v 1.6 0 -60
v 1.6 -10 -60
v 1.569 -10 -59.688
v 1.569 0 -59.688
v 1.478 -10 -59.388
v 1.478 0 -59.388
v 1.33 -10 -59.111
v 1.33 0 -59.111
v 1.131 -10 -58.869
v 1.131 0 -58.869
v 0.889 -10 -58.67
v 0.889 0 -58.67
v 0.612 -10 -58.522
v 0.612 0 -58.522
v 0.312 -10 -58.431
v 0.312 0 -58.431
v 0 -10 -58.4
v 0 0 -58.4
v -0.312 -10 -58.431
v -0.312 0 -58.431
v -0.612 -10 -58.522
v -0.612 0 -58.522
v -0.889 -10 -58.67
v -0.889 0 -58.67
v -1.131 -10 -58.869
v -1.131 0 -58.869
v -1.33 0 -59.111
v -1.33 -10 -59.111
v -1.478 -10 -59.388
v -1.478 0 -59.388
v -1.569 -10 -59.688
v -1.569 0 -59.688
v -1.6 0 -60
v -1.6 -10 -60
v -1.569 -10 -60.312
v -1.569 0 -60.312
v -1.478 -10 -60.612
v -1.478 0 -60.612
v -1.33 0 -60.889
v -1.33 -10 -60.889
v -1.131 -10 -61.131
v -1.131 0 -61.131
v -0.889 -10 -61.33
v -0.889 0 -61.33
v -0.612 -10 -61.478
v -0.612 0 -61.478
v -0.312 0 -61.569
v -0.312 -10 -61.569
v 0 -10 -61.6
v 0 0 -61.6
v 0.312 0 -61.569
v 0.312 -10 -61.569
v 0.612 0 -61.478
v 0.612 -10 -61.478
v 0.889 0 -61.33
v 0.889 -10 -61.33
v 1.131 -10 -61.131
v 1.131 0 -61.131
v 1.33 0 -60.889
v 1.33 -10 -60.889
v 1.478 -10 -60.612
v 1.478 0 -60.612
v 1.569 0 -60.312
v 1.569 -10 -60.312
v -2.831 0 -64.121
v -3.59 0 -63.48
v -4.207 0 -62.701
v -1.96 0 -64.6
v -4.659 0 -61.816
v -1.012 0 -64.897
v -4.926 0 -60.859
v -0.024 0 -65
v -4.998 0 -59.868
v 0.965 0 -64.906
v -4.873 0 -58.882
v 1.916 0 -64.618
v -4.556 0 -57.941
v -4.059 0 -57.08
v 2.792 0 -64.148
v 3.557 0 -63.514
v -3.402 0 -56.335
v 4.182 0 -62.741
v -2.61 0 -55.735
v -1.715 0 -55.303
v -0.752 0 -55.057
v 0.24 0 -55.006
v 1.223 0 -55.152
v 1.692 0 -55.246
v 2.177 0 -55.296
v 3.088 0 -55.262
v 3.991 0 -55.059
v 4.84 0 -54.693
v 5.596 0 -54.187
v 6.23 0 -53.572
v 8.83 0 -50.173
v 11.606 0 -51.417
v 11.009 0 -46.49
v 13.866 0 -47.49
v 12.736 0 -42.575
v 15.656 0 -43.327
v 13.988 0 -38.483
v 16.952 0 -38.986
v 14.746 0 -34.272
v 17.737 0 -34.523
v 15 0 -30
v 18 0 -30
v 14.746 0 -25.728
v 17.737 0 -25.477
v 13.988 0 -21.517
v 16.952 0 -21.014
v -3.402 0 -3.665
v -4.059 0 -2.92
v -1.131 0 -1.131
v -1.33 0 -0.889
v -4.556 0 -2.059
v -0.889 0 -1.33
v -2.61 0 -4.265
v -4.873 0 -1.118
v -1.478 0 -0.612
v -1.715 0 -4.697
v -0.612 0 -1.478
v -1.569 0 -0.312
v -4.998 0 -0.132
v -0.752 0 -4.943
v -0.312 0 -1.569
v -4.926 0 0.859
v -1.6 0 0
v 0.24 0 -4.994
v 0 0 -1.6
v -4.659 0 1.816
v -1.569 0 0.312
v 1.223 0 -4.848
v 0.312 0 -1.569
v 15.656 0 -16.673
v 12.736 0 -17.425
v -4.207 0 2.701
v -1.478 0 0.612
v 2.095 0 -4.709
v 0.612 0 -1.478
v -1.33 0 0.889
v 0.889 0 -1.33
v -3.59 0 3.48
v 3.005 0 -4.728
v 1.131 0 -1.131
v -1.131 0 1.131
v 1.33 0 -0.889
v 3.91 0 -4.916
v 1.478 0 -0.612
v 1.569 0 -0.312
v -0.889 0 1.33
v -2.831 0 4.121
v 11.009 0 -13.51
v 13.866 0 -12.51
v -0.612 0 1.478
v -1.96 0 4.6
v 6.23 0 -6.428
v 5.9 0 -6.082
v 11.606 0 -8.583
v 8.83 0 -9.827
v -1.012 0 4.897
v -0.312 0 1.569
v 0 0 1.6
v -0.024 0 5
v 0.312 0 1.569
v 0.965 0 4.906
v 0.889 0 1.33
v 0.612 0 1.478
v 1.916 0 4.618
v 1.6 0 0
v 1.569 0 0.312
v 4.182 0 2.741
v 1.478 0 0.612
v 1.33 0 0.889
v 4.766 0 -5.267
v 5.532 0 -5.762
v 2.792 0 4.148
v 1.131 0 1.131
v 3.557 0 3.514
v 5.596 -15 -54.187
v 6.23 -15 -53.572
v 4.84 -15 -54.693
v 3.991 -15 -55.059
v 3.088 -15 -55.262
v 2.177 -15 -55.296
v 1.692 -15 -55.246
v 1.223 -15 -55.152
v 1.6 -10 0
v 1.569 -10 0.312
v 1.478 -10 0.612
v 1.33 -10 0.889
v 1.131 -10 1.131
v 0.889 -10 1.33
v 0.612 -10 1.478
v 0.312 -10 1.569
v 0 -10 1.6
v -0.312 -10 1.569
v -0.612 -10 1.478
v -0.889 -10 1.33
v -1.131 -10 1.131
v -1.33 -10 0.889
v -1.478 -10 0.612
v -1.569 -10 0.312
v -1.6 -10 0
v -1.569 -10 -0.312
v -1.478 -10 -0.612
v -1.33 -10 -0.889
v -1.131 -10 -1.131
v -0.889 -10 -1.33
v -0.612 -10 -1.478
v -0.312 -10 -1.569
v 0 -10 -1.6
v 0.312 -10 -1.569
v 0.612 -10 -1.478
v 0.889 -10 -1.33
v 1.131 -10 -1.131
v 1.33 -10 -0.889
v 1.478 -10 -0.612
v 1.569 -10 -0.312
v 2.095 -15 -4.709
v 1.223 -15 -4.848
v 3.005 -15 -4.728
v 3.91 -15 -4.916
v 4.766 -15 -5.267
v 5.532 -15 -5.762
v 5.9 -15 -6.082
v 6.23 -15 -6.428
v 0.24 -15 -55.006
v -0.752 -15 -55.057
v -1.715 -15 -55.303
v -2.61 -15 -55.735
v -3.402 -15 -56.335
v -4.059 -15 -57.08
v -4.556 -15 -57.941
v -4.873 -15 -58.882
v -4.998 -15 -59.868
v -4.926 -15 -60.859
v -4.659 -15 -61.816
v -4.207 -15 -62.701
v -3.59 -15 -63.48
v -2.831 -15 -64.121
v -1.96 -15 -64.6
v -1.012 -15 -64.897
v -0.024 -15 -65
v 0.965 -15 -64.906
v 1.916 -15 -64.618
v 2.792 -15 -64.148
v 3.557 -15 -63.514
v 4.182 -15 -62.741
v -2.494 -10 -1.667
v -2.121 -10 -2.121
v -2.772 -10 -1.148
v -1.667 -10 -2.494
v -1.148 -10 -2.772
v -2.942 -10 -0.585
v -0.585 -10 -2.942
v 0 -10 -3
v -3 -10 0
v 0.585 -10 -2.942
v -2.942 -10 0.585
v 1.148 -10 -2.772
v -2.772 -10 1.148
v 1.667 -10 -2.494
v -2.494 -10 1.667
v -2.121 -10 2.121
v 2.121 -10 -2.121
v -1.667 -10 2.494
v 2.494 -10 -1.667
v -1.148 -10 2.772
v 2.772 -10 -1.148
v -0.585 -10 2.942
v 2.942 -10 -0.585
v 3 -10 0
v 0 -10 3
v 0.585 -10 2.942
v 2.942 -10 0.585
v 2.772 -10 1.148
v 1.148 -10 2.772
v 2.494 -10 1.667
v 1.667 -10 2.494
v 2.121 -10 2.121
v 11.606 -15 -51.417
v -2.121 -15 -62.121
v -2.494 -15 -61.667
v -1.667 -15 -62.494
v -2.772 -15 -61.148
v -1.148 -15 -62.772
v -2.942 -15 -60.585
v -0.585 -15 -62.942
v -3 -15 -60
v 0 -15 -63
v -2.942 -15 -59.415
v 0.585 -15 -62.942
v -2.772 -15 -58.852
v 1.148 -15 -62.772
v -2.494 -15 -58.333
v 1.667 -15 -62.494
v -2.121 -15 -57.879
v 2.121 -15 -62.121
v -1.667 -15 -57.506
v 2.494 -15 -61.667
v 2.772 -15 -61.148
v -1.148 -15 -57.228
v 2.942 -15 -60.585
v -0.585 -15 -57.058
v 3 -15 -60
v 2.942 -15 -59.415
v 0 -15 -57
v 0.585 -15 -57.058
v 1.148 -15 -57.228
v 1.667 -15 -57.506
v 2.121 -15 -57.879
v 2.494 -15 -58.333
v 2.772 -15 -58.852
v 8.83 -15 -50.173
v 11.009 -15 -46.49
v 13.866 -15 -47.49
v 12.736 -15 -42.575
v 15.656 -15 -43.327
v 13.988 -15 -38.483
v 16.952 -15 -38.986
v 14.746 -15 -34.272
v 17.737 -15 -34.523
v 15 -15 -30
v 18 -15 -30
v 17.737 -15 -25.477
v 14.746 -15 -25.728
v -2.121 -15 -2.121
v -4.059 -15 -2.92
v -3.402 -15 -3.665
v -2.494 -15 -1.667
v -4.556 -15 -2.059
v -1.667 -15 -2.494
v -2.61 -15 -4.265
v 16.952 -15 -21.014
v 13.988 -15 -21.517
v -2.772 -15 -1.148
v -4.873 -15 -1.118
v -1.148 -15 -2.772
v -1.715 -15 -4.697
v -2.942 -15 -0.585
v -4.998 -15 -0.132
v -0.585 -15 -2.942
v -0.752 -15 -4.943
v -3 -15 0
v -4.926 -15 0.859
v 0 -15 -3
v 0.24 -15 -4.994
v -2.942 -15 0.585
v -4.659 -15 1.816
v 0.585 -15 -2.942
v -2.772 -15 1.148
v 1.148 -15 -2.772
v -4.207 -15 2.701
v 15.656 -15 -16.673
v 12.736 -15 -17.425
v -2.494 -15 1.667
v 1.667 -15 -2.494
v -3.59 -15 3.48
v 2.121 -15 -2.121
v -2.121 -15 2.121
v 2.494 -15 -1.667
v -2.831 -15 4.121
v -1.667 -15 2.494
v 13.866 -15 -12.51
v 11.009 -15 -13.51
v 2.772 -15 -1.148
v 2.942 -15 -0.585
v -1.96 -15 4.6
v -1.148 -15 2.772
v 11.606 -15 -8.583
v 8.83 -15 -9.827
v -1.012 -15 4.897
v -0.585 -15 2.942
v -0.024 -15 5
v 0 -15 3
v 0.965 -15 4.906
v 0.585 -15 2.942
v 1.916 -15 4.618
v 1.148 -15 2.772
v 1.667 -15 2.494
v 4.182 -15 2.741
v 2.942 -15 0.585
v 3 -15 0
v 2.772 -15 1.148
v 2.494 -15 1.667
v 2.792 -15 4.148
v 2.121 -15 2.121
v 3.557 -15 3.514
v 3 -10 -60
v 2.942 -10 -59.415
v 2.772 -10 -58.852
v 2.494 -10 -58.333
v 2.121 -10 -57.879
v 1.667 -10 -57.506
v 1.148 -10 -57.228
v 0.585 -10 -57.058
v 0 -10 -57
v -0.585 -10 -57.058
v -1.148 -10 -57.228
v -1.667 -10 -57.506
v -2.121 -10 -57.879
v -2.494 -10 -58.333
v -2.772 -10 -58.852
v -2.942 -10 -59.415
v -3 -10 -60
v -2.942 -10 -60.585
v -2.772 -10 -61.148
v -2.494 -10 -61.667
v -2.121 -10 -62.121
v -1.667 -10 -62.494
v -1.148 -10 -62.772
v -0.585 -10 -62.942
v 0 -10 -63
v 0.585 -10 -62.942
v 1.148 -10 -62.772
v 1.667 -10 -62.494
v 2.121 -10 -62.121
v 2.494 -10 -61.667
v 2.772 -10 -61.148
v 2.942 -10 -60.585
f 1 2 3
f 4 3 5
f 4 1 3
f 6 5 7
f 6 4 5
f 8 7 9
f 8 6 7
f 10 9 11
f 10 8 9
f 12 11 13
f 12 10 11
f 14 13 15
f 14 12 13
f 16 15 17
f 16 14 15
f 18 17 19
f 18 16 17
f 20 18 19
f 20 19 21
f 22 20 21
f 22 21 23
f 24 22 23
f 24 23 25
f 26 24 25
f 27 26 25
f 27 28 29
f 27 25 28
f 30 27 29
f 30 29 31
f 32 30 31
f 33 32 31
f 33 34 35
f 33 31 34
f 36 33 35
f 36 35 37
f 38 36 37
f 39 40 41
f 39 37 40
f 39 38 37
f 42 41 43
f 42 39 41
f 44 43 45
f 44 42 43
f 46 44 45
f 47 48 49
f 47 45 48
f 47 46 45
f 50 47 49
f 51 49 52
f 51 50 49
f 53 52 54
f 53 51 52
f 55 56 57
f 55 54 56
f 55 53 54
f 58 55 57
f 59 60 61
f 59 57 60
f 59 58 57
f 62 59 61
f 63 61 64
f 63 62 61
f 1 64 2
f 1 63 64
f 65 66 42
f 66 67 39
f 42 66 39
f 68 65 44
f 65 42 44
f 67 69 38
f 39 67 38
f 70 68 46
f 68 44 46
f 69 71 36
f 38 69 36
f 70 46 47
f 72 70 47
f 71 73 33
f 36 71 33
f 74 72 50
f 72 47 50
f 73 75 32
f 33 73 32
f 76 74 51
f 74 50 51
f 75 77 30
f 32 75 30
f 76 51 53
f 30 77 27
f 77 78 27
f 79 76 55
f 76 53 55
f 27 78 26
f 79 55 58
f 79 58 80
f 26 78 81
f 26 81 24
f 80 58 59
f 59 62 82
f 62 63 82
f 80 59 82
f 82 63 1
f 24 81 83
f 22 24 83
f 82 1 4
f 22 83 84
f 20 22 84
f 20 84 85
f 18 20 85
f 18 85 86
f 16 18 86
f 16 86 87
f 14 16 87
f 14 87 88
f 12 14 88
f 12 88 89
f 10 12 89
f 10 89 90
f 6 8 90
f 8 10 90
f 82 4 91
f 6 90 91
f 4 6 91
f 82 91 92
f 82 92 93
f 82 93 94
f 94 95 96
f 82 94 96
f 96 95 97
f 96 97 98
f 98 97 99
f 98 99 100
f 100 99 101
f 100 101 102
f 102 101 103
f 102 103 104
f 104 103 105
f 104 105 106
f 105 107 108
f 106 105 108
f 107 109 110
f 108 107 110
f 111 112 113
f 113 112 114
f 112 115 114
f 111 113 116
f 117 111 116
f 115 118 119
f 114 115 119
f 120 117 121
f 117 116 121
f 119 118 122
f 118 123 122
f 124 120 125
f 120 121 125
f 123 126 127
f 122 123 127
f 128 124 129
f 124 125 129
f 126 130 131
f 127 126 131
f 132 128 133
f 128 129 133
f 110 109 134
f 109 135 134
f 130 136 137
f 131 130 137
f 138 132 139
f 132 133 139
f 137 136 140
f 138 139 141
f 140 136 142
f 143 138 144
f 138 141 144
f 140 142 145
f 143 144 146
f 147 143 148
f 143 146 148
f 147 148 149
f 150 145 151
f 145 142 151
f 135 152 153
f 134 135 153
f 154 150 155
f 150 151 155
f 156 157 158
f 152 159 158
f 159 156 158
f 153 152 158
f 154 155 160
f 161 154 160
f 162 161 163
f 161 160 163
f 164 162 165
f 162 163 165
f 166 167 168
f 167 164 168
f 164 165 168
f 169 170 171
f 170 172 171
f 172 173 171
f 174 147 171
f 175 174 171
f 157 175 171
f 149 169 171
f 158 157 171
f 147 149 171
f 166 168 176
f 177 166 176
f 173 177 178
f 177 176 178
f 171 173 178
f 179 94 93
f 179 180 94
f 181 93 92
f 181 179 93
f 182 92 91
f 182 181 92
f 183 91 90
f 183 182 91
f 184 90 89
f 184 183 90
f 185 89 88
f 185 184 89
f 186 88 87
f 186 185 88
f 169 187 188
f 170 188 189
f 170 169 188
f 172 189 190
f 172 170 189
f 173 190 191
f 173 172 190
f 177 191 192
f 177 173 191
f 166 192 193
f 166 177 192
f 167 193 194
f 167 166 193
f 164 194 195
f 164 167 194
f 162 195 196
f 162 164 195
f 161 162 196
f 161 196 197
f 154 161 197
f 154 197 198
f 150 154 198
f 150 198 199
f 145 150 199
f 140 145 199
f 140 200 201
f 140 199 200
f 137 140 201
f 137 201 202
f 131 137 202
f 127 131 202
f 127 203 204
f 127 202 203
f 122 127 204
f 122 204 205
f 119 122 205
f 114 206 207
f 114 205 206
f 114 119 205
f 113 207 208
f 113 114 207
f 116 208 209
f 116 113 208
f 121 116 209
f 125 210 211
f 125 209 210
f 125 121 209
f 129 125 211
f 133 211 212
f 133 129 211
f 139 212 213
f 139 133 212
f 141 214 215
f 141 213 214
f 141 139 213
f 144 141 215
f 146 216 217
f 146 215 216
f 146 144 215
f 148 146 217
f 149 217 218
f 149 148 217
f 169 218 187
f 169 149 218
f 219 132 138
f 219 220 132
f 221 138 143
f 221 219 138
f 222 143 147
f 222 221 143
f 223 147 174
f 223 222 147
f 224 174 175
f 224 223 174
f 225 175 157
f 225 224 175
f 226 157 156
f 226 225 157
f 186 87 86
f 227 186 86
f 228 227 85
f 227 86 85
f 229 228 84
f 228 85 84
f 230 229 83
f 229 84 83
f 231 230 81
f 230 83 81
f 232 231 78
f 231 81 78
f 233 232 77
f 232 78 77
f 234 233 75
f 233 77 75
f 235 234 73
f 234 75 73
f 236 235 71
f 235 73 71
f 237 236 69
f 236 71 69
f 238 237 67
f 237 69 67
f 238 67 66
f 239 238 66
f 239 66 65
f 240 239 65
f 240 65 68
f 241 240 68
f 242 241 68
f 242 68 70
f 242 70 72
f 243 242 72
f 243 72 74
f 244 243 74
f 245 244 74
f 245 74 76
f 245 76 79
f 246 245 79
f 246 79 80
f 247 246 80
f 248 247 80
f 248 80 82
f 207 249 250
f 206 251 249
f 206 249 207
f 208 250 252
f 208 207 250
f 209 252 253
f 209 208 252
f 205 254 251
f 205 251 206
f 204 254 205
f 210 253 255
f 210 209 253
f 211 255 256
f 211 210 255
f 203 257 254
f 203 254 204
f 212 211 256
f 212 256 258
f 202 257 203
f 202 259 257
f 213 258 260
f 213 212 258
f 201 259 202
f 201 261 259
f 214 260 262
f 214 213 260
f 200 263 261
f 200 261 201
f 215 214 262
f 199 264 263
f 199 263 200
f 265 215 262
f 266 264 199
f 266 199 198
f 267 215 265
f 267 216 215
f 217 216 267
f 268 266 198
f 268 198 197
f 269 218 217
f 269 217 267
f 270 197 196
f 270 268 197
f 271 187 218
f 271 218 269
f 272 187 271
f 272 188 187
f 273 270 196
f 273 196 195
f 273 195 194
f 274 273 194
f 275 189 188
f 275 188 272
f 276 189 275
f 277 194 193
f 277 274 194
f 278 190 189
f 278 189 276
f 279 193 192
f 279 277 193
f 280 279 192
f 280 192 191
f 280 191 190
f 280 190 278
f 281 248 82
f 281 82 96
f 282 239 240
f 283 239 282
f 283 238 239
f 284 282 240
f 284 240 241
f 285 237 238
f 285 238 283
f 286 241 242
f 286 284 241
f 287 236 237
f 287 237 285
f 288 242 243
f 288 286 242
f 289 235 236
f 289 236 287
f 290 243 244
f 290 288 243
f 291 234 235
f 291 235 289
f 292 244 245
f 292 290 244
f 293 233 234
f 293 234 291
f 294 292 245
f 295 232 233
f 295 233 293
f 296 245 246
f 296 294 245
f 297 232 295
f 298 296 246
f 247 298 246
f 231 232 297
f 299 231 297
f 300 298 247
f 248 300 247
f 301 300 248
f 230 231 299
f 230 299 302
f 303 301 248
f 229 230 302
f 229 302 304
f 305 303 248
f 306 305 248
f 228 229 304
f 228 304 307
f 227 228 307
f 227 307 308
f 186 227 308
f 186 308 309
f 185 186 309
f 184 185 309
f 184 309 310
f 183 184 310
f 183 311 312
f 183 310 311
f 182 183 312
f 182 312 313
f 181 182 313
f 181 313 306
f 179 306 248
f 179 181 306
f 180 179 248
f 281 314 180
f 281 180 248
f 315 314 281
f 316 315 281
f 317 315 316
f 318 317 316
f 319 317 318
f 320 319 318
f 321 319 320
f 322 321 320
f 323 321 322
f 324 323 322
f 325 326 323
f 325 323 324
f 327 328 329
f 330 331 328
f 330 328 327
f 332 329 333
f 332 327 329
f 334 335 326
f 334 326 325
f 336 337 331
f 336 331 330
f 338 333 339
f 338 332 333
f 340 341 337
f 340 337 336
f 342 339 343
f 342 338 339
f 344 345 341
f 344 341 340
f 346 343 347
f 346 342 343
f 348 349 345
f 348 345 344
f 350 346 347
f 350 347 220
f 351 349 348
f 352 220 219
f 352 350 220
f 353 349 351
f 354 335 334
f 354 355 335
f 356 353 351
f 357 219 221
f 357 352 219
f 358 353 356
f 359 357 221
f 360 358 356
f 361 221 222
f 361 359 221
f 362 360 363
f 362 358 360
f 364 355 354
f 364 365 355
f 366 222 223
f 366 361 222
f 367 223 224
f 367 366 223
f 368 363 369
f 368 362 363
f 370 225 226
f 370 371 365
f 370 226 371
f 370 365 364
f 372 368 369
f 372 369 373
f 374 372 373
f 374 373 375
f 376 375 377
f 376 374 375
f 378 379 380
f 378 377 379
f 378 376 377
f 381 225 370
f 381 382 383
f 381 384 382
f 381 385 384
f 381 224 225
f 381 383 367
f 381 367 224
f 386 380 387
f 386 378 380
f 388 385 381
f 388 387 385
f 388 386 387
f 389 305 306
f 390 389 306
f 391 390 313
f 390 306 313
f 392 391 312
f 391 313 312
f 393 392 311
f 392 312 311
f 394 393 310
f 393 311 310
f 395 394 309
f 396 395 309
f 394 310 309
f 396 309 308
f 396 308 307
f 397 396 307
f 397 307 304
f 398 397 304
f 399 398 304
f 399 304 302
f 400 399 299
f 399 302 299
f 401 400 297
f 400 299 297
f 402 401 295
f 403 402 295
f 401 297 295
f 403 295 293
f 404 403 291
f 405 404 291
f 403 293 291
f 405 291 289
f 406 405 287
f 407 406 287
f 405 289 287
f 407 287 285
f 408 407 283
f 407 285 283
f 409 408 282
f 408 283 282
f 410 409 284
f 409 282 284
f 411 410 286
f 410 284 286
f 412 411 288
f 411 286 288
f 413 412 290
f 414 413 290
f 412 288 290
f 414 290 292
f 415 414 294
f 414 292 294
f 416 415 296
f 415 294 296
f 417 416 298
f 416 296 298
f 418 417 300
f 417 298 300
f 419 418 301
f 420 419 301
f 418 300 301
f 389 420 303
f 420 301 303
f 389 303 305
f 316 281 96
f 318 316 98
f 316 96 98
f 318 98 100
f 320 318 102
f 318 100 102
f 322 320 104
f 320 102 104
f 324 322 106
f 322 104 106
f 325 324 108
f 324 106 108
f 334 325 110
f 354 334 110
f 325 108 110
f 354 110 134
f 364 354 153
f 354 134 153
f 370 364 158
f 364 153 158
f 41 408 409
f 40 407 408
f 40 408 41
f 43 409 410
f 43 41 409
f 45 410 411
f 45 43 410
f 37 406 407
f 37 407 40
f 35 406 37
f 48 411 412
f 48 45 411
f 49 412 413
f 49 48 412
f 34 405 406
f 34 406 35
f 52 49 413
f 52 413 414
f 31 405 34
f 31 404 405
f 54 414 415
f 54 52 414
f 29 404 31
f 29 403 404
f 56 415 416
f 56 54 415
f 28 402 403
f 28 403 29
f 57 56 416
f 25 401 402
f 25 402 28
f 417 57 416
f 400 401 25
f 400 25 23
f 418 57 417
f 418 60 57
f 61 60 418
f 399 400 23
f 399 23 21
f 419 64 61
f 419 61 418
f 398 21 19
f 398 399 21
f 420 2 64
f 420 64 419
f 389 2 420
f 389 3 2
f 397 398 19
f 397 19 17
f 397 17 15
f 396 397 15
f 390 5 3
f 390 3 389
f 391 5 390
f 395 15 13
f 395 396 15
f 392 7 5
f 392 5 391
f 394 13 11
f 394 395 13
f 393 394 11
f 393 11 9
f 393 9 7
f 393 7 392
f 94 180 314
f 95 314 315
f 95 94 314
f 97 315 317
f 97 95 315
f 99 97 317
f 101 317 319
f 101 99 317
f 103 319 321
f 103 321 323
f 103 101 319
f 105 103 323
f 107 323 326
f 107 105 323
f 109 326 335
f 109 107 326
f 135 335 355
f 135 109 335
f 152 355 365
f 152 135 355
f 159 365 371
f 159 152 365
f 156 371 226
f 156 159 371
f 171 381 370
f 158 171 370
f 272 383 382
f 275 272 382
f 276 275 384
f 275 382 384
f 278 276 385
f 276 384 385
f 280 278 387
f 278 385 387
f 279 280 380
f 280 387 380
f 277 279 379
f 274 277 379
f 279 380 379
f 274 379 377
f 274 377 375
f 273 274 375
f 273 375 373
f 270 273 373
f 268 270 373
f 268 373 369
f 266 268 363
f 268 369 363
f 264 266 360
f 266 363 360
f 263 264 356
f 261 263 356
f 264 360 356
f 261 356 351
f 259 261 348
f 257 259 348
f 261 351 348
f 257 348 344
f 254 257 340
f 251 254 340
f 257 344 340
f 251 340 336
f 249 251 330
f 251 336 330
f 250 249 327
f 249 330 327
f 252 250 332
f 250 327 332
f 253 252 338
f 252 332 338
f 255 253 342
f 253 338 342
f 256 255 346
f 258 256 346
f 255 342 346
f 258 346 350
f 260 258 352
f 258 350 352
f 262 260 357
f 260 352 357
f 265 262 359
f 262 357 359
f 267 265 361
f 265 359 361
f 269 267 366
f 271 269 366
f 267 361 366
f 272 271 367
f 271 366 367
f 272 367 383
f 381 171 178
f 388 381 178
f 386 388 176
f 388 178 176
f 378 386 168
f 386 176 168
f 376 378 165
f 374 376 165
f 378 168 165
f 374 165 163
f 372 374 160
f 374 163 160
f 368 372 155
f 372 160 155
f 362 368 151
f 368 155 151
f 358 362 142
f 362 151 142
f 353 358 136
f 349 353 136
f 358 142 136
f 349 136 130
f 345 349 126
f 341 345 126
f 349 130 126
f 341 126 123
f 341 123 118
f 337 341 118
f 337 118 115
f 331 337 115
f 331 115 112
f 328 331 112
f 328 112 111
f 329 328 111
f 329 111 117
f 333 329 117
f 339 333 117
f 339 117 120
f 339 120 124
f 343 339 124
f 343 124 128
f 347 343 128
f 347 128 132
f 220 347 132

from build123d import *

# Parameters (mm, degrees)
SKETCH_R     = 1.6
PAD_DEPTH    = 15
FILLET_R     = 5
SKETCH001_R  = 3
POCKET_DEPTH = 5


with BuildPart() as part:
    # Sketch → Pad (new body)
    with BuildSketch(Plane.XZ):
        with BuildLine():
            ThreePointArc((4.181539, 2.741301), (-4.970119, 0.54582), (3.486952, -3.583457))
            ThreePointArc((3.486952, -56.416543), (15, -30), (3.486952, -3.583457))
            ThreePointArc((3.486952, -56.416543), (-4.970119, -60.54582), (4.181539, -62.741301))
            Line((4.181539, -62.741301), (11.605736, -51.416543))
            ThreePointArc((11.605736, -51.416543), (18, -30), (11.605736, -8.583457))
            Line((4.181539, 2.741301), (11.605736, -8.583457))
        make_face()
        Circle(SKETCH_R, mode=Mode.SUBTRACT)
        with Locations((0, -60)):
            Circle(SKETCH_R, mode=Mode.SUBTRACT)
    extrude(amount=PAD_DEPTH)

    # Fillet
    fillet_edges = [part.edges().sort_by_distance(p)[0] for p in [
        (3.486952, -7.5, -3.583457),
        (3.486952, -7.5, -56.416543),
    ]]
    fillet(fillet_edges, radius=FILLET_R)

    # Sketch001 (on Face5 of Fillet) → Pocket (cut)
    with BuildSketch(Plane.XZ.offset(15)):
        Circle(SKETCH001_R)
        with Locations((0, -60)):
            Circle(SKETCH001_R)
    extrude(amount=-POCKET_DEPTH, mode=Mode.SUBTRACT)


solid = part.part
